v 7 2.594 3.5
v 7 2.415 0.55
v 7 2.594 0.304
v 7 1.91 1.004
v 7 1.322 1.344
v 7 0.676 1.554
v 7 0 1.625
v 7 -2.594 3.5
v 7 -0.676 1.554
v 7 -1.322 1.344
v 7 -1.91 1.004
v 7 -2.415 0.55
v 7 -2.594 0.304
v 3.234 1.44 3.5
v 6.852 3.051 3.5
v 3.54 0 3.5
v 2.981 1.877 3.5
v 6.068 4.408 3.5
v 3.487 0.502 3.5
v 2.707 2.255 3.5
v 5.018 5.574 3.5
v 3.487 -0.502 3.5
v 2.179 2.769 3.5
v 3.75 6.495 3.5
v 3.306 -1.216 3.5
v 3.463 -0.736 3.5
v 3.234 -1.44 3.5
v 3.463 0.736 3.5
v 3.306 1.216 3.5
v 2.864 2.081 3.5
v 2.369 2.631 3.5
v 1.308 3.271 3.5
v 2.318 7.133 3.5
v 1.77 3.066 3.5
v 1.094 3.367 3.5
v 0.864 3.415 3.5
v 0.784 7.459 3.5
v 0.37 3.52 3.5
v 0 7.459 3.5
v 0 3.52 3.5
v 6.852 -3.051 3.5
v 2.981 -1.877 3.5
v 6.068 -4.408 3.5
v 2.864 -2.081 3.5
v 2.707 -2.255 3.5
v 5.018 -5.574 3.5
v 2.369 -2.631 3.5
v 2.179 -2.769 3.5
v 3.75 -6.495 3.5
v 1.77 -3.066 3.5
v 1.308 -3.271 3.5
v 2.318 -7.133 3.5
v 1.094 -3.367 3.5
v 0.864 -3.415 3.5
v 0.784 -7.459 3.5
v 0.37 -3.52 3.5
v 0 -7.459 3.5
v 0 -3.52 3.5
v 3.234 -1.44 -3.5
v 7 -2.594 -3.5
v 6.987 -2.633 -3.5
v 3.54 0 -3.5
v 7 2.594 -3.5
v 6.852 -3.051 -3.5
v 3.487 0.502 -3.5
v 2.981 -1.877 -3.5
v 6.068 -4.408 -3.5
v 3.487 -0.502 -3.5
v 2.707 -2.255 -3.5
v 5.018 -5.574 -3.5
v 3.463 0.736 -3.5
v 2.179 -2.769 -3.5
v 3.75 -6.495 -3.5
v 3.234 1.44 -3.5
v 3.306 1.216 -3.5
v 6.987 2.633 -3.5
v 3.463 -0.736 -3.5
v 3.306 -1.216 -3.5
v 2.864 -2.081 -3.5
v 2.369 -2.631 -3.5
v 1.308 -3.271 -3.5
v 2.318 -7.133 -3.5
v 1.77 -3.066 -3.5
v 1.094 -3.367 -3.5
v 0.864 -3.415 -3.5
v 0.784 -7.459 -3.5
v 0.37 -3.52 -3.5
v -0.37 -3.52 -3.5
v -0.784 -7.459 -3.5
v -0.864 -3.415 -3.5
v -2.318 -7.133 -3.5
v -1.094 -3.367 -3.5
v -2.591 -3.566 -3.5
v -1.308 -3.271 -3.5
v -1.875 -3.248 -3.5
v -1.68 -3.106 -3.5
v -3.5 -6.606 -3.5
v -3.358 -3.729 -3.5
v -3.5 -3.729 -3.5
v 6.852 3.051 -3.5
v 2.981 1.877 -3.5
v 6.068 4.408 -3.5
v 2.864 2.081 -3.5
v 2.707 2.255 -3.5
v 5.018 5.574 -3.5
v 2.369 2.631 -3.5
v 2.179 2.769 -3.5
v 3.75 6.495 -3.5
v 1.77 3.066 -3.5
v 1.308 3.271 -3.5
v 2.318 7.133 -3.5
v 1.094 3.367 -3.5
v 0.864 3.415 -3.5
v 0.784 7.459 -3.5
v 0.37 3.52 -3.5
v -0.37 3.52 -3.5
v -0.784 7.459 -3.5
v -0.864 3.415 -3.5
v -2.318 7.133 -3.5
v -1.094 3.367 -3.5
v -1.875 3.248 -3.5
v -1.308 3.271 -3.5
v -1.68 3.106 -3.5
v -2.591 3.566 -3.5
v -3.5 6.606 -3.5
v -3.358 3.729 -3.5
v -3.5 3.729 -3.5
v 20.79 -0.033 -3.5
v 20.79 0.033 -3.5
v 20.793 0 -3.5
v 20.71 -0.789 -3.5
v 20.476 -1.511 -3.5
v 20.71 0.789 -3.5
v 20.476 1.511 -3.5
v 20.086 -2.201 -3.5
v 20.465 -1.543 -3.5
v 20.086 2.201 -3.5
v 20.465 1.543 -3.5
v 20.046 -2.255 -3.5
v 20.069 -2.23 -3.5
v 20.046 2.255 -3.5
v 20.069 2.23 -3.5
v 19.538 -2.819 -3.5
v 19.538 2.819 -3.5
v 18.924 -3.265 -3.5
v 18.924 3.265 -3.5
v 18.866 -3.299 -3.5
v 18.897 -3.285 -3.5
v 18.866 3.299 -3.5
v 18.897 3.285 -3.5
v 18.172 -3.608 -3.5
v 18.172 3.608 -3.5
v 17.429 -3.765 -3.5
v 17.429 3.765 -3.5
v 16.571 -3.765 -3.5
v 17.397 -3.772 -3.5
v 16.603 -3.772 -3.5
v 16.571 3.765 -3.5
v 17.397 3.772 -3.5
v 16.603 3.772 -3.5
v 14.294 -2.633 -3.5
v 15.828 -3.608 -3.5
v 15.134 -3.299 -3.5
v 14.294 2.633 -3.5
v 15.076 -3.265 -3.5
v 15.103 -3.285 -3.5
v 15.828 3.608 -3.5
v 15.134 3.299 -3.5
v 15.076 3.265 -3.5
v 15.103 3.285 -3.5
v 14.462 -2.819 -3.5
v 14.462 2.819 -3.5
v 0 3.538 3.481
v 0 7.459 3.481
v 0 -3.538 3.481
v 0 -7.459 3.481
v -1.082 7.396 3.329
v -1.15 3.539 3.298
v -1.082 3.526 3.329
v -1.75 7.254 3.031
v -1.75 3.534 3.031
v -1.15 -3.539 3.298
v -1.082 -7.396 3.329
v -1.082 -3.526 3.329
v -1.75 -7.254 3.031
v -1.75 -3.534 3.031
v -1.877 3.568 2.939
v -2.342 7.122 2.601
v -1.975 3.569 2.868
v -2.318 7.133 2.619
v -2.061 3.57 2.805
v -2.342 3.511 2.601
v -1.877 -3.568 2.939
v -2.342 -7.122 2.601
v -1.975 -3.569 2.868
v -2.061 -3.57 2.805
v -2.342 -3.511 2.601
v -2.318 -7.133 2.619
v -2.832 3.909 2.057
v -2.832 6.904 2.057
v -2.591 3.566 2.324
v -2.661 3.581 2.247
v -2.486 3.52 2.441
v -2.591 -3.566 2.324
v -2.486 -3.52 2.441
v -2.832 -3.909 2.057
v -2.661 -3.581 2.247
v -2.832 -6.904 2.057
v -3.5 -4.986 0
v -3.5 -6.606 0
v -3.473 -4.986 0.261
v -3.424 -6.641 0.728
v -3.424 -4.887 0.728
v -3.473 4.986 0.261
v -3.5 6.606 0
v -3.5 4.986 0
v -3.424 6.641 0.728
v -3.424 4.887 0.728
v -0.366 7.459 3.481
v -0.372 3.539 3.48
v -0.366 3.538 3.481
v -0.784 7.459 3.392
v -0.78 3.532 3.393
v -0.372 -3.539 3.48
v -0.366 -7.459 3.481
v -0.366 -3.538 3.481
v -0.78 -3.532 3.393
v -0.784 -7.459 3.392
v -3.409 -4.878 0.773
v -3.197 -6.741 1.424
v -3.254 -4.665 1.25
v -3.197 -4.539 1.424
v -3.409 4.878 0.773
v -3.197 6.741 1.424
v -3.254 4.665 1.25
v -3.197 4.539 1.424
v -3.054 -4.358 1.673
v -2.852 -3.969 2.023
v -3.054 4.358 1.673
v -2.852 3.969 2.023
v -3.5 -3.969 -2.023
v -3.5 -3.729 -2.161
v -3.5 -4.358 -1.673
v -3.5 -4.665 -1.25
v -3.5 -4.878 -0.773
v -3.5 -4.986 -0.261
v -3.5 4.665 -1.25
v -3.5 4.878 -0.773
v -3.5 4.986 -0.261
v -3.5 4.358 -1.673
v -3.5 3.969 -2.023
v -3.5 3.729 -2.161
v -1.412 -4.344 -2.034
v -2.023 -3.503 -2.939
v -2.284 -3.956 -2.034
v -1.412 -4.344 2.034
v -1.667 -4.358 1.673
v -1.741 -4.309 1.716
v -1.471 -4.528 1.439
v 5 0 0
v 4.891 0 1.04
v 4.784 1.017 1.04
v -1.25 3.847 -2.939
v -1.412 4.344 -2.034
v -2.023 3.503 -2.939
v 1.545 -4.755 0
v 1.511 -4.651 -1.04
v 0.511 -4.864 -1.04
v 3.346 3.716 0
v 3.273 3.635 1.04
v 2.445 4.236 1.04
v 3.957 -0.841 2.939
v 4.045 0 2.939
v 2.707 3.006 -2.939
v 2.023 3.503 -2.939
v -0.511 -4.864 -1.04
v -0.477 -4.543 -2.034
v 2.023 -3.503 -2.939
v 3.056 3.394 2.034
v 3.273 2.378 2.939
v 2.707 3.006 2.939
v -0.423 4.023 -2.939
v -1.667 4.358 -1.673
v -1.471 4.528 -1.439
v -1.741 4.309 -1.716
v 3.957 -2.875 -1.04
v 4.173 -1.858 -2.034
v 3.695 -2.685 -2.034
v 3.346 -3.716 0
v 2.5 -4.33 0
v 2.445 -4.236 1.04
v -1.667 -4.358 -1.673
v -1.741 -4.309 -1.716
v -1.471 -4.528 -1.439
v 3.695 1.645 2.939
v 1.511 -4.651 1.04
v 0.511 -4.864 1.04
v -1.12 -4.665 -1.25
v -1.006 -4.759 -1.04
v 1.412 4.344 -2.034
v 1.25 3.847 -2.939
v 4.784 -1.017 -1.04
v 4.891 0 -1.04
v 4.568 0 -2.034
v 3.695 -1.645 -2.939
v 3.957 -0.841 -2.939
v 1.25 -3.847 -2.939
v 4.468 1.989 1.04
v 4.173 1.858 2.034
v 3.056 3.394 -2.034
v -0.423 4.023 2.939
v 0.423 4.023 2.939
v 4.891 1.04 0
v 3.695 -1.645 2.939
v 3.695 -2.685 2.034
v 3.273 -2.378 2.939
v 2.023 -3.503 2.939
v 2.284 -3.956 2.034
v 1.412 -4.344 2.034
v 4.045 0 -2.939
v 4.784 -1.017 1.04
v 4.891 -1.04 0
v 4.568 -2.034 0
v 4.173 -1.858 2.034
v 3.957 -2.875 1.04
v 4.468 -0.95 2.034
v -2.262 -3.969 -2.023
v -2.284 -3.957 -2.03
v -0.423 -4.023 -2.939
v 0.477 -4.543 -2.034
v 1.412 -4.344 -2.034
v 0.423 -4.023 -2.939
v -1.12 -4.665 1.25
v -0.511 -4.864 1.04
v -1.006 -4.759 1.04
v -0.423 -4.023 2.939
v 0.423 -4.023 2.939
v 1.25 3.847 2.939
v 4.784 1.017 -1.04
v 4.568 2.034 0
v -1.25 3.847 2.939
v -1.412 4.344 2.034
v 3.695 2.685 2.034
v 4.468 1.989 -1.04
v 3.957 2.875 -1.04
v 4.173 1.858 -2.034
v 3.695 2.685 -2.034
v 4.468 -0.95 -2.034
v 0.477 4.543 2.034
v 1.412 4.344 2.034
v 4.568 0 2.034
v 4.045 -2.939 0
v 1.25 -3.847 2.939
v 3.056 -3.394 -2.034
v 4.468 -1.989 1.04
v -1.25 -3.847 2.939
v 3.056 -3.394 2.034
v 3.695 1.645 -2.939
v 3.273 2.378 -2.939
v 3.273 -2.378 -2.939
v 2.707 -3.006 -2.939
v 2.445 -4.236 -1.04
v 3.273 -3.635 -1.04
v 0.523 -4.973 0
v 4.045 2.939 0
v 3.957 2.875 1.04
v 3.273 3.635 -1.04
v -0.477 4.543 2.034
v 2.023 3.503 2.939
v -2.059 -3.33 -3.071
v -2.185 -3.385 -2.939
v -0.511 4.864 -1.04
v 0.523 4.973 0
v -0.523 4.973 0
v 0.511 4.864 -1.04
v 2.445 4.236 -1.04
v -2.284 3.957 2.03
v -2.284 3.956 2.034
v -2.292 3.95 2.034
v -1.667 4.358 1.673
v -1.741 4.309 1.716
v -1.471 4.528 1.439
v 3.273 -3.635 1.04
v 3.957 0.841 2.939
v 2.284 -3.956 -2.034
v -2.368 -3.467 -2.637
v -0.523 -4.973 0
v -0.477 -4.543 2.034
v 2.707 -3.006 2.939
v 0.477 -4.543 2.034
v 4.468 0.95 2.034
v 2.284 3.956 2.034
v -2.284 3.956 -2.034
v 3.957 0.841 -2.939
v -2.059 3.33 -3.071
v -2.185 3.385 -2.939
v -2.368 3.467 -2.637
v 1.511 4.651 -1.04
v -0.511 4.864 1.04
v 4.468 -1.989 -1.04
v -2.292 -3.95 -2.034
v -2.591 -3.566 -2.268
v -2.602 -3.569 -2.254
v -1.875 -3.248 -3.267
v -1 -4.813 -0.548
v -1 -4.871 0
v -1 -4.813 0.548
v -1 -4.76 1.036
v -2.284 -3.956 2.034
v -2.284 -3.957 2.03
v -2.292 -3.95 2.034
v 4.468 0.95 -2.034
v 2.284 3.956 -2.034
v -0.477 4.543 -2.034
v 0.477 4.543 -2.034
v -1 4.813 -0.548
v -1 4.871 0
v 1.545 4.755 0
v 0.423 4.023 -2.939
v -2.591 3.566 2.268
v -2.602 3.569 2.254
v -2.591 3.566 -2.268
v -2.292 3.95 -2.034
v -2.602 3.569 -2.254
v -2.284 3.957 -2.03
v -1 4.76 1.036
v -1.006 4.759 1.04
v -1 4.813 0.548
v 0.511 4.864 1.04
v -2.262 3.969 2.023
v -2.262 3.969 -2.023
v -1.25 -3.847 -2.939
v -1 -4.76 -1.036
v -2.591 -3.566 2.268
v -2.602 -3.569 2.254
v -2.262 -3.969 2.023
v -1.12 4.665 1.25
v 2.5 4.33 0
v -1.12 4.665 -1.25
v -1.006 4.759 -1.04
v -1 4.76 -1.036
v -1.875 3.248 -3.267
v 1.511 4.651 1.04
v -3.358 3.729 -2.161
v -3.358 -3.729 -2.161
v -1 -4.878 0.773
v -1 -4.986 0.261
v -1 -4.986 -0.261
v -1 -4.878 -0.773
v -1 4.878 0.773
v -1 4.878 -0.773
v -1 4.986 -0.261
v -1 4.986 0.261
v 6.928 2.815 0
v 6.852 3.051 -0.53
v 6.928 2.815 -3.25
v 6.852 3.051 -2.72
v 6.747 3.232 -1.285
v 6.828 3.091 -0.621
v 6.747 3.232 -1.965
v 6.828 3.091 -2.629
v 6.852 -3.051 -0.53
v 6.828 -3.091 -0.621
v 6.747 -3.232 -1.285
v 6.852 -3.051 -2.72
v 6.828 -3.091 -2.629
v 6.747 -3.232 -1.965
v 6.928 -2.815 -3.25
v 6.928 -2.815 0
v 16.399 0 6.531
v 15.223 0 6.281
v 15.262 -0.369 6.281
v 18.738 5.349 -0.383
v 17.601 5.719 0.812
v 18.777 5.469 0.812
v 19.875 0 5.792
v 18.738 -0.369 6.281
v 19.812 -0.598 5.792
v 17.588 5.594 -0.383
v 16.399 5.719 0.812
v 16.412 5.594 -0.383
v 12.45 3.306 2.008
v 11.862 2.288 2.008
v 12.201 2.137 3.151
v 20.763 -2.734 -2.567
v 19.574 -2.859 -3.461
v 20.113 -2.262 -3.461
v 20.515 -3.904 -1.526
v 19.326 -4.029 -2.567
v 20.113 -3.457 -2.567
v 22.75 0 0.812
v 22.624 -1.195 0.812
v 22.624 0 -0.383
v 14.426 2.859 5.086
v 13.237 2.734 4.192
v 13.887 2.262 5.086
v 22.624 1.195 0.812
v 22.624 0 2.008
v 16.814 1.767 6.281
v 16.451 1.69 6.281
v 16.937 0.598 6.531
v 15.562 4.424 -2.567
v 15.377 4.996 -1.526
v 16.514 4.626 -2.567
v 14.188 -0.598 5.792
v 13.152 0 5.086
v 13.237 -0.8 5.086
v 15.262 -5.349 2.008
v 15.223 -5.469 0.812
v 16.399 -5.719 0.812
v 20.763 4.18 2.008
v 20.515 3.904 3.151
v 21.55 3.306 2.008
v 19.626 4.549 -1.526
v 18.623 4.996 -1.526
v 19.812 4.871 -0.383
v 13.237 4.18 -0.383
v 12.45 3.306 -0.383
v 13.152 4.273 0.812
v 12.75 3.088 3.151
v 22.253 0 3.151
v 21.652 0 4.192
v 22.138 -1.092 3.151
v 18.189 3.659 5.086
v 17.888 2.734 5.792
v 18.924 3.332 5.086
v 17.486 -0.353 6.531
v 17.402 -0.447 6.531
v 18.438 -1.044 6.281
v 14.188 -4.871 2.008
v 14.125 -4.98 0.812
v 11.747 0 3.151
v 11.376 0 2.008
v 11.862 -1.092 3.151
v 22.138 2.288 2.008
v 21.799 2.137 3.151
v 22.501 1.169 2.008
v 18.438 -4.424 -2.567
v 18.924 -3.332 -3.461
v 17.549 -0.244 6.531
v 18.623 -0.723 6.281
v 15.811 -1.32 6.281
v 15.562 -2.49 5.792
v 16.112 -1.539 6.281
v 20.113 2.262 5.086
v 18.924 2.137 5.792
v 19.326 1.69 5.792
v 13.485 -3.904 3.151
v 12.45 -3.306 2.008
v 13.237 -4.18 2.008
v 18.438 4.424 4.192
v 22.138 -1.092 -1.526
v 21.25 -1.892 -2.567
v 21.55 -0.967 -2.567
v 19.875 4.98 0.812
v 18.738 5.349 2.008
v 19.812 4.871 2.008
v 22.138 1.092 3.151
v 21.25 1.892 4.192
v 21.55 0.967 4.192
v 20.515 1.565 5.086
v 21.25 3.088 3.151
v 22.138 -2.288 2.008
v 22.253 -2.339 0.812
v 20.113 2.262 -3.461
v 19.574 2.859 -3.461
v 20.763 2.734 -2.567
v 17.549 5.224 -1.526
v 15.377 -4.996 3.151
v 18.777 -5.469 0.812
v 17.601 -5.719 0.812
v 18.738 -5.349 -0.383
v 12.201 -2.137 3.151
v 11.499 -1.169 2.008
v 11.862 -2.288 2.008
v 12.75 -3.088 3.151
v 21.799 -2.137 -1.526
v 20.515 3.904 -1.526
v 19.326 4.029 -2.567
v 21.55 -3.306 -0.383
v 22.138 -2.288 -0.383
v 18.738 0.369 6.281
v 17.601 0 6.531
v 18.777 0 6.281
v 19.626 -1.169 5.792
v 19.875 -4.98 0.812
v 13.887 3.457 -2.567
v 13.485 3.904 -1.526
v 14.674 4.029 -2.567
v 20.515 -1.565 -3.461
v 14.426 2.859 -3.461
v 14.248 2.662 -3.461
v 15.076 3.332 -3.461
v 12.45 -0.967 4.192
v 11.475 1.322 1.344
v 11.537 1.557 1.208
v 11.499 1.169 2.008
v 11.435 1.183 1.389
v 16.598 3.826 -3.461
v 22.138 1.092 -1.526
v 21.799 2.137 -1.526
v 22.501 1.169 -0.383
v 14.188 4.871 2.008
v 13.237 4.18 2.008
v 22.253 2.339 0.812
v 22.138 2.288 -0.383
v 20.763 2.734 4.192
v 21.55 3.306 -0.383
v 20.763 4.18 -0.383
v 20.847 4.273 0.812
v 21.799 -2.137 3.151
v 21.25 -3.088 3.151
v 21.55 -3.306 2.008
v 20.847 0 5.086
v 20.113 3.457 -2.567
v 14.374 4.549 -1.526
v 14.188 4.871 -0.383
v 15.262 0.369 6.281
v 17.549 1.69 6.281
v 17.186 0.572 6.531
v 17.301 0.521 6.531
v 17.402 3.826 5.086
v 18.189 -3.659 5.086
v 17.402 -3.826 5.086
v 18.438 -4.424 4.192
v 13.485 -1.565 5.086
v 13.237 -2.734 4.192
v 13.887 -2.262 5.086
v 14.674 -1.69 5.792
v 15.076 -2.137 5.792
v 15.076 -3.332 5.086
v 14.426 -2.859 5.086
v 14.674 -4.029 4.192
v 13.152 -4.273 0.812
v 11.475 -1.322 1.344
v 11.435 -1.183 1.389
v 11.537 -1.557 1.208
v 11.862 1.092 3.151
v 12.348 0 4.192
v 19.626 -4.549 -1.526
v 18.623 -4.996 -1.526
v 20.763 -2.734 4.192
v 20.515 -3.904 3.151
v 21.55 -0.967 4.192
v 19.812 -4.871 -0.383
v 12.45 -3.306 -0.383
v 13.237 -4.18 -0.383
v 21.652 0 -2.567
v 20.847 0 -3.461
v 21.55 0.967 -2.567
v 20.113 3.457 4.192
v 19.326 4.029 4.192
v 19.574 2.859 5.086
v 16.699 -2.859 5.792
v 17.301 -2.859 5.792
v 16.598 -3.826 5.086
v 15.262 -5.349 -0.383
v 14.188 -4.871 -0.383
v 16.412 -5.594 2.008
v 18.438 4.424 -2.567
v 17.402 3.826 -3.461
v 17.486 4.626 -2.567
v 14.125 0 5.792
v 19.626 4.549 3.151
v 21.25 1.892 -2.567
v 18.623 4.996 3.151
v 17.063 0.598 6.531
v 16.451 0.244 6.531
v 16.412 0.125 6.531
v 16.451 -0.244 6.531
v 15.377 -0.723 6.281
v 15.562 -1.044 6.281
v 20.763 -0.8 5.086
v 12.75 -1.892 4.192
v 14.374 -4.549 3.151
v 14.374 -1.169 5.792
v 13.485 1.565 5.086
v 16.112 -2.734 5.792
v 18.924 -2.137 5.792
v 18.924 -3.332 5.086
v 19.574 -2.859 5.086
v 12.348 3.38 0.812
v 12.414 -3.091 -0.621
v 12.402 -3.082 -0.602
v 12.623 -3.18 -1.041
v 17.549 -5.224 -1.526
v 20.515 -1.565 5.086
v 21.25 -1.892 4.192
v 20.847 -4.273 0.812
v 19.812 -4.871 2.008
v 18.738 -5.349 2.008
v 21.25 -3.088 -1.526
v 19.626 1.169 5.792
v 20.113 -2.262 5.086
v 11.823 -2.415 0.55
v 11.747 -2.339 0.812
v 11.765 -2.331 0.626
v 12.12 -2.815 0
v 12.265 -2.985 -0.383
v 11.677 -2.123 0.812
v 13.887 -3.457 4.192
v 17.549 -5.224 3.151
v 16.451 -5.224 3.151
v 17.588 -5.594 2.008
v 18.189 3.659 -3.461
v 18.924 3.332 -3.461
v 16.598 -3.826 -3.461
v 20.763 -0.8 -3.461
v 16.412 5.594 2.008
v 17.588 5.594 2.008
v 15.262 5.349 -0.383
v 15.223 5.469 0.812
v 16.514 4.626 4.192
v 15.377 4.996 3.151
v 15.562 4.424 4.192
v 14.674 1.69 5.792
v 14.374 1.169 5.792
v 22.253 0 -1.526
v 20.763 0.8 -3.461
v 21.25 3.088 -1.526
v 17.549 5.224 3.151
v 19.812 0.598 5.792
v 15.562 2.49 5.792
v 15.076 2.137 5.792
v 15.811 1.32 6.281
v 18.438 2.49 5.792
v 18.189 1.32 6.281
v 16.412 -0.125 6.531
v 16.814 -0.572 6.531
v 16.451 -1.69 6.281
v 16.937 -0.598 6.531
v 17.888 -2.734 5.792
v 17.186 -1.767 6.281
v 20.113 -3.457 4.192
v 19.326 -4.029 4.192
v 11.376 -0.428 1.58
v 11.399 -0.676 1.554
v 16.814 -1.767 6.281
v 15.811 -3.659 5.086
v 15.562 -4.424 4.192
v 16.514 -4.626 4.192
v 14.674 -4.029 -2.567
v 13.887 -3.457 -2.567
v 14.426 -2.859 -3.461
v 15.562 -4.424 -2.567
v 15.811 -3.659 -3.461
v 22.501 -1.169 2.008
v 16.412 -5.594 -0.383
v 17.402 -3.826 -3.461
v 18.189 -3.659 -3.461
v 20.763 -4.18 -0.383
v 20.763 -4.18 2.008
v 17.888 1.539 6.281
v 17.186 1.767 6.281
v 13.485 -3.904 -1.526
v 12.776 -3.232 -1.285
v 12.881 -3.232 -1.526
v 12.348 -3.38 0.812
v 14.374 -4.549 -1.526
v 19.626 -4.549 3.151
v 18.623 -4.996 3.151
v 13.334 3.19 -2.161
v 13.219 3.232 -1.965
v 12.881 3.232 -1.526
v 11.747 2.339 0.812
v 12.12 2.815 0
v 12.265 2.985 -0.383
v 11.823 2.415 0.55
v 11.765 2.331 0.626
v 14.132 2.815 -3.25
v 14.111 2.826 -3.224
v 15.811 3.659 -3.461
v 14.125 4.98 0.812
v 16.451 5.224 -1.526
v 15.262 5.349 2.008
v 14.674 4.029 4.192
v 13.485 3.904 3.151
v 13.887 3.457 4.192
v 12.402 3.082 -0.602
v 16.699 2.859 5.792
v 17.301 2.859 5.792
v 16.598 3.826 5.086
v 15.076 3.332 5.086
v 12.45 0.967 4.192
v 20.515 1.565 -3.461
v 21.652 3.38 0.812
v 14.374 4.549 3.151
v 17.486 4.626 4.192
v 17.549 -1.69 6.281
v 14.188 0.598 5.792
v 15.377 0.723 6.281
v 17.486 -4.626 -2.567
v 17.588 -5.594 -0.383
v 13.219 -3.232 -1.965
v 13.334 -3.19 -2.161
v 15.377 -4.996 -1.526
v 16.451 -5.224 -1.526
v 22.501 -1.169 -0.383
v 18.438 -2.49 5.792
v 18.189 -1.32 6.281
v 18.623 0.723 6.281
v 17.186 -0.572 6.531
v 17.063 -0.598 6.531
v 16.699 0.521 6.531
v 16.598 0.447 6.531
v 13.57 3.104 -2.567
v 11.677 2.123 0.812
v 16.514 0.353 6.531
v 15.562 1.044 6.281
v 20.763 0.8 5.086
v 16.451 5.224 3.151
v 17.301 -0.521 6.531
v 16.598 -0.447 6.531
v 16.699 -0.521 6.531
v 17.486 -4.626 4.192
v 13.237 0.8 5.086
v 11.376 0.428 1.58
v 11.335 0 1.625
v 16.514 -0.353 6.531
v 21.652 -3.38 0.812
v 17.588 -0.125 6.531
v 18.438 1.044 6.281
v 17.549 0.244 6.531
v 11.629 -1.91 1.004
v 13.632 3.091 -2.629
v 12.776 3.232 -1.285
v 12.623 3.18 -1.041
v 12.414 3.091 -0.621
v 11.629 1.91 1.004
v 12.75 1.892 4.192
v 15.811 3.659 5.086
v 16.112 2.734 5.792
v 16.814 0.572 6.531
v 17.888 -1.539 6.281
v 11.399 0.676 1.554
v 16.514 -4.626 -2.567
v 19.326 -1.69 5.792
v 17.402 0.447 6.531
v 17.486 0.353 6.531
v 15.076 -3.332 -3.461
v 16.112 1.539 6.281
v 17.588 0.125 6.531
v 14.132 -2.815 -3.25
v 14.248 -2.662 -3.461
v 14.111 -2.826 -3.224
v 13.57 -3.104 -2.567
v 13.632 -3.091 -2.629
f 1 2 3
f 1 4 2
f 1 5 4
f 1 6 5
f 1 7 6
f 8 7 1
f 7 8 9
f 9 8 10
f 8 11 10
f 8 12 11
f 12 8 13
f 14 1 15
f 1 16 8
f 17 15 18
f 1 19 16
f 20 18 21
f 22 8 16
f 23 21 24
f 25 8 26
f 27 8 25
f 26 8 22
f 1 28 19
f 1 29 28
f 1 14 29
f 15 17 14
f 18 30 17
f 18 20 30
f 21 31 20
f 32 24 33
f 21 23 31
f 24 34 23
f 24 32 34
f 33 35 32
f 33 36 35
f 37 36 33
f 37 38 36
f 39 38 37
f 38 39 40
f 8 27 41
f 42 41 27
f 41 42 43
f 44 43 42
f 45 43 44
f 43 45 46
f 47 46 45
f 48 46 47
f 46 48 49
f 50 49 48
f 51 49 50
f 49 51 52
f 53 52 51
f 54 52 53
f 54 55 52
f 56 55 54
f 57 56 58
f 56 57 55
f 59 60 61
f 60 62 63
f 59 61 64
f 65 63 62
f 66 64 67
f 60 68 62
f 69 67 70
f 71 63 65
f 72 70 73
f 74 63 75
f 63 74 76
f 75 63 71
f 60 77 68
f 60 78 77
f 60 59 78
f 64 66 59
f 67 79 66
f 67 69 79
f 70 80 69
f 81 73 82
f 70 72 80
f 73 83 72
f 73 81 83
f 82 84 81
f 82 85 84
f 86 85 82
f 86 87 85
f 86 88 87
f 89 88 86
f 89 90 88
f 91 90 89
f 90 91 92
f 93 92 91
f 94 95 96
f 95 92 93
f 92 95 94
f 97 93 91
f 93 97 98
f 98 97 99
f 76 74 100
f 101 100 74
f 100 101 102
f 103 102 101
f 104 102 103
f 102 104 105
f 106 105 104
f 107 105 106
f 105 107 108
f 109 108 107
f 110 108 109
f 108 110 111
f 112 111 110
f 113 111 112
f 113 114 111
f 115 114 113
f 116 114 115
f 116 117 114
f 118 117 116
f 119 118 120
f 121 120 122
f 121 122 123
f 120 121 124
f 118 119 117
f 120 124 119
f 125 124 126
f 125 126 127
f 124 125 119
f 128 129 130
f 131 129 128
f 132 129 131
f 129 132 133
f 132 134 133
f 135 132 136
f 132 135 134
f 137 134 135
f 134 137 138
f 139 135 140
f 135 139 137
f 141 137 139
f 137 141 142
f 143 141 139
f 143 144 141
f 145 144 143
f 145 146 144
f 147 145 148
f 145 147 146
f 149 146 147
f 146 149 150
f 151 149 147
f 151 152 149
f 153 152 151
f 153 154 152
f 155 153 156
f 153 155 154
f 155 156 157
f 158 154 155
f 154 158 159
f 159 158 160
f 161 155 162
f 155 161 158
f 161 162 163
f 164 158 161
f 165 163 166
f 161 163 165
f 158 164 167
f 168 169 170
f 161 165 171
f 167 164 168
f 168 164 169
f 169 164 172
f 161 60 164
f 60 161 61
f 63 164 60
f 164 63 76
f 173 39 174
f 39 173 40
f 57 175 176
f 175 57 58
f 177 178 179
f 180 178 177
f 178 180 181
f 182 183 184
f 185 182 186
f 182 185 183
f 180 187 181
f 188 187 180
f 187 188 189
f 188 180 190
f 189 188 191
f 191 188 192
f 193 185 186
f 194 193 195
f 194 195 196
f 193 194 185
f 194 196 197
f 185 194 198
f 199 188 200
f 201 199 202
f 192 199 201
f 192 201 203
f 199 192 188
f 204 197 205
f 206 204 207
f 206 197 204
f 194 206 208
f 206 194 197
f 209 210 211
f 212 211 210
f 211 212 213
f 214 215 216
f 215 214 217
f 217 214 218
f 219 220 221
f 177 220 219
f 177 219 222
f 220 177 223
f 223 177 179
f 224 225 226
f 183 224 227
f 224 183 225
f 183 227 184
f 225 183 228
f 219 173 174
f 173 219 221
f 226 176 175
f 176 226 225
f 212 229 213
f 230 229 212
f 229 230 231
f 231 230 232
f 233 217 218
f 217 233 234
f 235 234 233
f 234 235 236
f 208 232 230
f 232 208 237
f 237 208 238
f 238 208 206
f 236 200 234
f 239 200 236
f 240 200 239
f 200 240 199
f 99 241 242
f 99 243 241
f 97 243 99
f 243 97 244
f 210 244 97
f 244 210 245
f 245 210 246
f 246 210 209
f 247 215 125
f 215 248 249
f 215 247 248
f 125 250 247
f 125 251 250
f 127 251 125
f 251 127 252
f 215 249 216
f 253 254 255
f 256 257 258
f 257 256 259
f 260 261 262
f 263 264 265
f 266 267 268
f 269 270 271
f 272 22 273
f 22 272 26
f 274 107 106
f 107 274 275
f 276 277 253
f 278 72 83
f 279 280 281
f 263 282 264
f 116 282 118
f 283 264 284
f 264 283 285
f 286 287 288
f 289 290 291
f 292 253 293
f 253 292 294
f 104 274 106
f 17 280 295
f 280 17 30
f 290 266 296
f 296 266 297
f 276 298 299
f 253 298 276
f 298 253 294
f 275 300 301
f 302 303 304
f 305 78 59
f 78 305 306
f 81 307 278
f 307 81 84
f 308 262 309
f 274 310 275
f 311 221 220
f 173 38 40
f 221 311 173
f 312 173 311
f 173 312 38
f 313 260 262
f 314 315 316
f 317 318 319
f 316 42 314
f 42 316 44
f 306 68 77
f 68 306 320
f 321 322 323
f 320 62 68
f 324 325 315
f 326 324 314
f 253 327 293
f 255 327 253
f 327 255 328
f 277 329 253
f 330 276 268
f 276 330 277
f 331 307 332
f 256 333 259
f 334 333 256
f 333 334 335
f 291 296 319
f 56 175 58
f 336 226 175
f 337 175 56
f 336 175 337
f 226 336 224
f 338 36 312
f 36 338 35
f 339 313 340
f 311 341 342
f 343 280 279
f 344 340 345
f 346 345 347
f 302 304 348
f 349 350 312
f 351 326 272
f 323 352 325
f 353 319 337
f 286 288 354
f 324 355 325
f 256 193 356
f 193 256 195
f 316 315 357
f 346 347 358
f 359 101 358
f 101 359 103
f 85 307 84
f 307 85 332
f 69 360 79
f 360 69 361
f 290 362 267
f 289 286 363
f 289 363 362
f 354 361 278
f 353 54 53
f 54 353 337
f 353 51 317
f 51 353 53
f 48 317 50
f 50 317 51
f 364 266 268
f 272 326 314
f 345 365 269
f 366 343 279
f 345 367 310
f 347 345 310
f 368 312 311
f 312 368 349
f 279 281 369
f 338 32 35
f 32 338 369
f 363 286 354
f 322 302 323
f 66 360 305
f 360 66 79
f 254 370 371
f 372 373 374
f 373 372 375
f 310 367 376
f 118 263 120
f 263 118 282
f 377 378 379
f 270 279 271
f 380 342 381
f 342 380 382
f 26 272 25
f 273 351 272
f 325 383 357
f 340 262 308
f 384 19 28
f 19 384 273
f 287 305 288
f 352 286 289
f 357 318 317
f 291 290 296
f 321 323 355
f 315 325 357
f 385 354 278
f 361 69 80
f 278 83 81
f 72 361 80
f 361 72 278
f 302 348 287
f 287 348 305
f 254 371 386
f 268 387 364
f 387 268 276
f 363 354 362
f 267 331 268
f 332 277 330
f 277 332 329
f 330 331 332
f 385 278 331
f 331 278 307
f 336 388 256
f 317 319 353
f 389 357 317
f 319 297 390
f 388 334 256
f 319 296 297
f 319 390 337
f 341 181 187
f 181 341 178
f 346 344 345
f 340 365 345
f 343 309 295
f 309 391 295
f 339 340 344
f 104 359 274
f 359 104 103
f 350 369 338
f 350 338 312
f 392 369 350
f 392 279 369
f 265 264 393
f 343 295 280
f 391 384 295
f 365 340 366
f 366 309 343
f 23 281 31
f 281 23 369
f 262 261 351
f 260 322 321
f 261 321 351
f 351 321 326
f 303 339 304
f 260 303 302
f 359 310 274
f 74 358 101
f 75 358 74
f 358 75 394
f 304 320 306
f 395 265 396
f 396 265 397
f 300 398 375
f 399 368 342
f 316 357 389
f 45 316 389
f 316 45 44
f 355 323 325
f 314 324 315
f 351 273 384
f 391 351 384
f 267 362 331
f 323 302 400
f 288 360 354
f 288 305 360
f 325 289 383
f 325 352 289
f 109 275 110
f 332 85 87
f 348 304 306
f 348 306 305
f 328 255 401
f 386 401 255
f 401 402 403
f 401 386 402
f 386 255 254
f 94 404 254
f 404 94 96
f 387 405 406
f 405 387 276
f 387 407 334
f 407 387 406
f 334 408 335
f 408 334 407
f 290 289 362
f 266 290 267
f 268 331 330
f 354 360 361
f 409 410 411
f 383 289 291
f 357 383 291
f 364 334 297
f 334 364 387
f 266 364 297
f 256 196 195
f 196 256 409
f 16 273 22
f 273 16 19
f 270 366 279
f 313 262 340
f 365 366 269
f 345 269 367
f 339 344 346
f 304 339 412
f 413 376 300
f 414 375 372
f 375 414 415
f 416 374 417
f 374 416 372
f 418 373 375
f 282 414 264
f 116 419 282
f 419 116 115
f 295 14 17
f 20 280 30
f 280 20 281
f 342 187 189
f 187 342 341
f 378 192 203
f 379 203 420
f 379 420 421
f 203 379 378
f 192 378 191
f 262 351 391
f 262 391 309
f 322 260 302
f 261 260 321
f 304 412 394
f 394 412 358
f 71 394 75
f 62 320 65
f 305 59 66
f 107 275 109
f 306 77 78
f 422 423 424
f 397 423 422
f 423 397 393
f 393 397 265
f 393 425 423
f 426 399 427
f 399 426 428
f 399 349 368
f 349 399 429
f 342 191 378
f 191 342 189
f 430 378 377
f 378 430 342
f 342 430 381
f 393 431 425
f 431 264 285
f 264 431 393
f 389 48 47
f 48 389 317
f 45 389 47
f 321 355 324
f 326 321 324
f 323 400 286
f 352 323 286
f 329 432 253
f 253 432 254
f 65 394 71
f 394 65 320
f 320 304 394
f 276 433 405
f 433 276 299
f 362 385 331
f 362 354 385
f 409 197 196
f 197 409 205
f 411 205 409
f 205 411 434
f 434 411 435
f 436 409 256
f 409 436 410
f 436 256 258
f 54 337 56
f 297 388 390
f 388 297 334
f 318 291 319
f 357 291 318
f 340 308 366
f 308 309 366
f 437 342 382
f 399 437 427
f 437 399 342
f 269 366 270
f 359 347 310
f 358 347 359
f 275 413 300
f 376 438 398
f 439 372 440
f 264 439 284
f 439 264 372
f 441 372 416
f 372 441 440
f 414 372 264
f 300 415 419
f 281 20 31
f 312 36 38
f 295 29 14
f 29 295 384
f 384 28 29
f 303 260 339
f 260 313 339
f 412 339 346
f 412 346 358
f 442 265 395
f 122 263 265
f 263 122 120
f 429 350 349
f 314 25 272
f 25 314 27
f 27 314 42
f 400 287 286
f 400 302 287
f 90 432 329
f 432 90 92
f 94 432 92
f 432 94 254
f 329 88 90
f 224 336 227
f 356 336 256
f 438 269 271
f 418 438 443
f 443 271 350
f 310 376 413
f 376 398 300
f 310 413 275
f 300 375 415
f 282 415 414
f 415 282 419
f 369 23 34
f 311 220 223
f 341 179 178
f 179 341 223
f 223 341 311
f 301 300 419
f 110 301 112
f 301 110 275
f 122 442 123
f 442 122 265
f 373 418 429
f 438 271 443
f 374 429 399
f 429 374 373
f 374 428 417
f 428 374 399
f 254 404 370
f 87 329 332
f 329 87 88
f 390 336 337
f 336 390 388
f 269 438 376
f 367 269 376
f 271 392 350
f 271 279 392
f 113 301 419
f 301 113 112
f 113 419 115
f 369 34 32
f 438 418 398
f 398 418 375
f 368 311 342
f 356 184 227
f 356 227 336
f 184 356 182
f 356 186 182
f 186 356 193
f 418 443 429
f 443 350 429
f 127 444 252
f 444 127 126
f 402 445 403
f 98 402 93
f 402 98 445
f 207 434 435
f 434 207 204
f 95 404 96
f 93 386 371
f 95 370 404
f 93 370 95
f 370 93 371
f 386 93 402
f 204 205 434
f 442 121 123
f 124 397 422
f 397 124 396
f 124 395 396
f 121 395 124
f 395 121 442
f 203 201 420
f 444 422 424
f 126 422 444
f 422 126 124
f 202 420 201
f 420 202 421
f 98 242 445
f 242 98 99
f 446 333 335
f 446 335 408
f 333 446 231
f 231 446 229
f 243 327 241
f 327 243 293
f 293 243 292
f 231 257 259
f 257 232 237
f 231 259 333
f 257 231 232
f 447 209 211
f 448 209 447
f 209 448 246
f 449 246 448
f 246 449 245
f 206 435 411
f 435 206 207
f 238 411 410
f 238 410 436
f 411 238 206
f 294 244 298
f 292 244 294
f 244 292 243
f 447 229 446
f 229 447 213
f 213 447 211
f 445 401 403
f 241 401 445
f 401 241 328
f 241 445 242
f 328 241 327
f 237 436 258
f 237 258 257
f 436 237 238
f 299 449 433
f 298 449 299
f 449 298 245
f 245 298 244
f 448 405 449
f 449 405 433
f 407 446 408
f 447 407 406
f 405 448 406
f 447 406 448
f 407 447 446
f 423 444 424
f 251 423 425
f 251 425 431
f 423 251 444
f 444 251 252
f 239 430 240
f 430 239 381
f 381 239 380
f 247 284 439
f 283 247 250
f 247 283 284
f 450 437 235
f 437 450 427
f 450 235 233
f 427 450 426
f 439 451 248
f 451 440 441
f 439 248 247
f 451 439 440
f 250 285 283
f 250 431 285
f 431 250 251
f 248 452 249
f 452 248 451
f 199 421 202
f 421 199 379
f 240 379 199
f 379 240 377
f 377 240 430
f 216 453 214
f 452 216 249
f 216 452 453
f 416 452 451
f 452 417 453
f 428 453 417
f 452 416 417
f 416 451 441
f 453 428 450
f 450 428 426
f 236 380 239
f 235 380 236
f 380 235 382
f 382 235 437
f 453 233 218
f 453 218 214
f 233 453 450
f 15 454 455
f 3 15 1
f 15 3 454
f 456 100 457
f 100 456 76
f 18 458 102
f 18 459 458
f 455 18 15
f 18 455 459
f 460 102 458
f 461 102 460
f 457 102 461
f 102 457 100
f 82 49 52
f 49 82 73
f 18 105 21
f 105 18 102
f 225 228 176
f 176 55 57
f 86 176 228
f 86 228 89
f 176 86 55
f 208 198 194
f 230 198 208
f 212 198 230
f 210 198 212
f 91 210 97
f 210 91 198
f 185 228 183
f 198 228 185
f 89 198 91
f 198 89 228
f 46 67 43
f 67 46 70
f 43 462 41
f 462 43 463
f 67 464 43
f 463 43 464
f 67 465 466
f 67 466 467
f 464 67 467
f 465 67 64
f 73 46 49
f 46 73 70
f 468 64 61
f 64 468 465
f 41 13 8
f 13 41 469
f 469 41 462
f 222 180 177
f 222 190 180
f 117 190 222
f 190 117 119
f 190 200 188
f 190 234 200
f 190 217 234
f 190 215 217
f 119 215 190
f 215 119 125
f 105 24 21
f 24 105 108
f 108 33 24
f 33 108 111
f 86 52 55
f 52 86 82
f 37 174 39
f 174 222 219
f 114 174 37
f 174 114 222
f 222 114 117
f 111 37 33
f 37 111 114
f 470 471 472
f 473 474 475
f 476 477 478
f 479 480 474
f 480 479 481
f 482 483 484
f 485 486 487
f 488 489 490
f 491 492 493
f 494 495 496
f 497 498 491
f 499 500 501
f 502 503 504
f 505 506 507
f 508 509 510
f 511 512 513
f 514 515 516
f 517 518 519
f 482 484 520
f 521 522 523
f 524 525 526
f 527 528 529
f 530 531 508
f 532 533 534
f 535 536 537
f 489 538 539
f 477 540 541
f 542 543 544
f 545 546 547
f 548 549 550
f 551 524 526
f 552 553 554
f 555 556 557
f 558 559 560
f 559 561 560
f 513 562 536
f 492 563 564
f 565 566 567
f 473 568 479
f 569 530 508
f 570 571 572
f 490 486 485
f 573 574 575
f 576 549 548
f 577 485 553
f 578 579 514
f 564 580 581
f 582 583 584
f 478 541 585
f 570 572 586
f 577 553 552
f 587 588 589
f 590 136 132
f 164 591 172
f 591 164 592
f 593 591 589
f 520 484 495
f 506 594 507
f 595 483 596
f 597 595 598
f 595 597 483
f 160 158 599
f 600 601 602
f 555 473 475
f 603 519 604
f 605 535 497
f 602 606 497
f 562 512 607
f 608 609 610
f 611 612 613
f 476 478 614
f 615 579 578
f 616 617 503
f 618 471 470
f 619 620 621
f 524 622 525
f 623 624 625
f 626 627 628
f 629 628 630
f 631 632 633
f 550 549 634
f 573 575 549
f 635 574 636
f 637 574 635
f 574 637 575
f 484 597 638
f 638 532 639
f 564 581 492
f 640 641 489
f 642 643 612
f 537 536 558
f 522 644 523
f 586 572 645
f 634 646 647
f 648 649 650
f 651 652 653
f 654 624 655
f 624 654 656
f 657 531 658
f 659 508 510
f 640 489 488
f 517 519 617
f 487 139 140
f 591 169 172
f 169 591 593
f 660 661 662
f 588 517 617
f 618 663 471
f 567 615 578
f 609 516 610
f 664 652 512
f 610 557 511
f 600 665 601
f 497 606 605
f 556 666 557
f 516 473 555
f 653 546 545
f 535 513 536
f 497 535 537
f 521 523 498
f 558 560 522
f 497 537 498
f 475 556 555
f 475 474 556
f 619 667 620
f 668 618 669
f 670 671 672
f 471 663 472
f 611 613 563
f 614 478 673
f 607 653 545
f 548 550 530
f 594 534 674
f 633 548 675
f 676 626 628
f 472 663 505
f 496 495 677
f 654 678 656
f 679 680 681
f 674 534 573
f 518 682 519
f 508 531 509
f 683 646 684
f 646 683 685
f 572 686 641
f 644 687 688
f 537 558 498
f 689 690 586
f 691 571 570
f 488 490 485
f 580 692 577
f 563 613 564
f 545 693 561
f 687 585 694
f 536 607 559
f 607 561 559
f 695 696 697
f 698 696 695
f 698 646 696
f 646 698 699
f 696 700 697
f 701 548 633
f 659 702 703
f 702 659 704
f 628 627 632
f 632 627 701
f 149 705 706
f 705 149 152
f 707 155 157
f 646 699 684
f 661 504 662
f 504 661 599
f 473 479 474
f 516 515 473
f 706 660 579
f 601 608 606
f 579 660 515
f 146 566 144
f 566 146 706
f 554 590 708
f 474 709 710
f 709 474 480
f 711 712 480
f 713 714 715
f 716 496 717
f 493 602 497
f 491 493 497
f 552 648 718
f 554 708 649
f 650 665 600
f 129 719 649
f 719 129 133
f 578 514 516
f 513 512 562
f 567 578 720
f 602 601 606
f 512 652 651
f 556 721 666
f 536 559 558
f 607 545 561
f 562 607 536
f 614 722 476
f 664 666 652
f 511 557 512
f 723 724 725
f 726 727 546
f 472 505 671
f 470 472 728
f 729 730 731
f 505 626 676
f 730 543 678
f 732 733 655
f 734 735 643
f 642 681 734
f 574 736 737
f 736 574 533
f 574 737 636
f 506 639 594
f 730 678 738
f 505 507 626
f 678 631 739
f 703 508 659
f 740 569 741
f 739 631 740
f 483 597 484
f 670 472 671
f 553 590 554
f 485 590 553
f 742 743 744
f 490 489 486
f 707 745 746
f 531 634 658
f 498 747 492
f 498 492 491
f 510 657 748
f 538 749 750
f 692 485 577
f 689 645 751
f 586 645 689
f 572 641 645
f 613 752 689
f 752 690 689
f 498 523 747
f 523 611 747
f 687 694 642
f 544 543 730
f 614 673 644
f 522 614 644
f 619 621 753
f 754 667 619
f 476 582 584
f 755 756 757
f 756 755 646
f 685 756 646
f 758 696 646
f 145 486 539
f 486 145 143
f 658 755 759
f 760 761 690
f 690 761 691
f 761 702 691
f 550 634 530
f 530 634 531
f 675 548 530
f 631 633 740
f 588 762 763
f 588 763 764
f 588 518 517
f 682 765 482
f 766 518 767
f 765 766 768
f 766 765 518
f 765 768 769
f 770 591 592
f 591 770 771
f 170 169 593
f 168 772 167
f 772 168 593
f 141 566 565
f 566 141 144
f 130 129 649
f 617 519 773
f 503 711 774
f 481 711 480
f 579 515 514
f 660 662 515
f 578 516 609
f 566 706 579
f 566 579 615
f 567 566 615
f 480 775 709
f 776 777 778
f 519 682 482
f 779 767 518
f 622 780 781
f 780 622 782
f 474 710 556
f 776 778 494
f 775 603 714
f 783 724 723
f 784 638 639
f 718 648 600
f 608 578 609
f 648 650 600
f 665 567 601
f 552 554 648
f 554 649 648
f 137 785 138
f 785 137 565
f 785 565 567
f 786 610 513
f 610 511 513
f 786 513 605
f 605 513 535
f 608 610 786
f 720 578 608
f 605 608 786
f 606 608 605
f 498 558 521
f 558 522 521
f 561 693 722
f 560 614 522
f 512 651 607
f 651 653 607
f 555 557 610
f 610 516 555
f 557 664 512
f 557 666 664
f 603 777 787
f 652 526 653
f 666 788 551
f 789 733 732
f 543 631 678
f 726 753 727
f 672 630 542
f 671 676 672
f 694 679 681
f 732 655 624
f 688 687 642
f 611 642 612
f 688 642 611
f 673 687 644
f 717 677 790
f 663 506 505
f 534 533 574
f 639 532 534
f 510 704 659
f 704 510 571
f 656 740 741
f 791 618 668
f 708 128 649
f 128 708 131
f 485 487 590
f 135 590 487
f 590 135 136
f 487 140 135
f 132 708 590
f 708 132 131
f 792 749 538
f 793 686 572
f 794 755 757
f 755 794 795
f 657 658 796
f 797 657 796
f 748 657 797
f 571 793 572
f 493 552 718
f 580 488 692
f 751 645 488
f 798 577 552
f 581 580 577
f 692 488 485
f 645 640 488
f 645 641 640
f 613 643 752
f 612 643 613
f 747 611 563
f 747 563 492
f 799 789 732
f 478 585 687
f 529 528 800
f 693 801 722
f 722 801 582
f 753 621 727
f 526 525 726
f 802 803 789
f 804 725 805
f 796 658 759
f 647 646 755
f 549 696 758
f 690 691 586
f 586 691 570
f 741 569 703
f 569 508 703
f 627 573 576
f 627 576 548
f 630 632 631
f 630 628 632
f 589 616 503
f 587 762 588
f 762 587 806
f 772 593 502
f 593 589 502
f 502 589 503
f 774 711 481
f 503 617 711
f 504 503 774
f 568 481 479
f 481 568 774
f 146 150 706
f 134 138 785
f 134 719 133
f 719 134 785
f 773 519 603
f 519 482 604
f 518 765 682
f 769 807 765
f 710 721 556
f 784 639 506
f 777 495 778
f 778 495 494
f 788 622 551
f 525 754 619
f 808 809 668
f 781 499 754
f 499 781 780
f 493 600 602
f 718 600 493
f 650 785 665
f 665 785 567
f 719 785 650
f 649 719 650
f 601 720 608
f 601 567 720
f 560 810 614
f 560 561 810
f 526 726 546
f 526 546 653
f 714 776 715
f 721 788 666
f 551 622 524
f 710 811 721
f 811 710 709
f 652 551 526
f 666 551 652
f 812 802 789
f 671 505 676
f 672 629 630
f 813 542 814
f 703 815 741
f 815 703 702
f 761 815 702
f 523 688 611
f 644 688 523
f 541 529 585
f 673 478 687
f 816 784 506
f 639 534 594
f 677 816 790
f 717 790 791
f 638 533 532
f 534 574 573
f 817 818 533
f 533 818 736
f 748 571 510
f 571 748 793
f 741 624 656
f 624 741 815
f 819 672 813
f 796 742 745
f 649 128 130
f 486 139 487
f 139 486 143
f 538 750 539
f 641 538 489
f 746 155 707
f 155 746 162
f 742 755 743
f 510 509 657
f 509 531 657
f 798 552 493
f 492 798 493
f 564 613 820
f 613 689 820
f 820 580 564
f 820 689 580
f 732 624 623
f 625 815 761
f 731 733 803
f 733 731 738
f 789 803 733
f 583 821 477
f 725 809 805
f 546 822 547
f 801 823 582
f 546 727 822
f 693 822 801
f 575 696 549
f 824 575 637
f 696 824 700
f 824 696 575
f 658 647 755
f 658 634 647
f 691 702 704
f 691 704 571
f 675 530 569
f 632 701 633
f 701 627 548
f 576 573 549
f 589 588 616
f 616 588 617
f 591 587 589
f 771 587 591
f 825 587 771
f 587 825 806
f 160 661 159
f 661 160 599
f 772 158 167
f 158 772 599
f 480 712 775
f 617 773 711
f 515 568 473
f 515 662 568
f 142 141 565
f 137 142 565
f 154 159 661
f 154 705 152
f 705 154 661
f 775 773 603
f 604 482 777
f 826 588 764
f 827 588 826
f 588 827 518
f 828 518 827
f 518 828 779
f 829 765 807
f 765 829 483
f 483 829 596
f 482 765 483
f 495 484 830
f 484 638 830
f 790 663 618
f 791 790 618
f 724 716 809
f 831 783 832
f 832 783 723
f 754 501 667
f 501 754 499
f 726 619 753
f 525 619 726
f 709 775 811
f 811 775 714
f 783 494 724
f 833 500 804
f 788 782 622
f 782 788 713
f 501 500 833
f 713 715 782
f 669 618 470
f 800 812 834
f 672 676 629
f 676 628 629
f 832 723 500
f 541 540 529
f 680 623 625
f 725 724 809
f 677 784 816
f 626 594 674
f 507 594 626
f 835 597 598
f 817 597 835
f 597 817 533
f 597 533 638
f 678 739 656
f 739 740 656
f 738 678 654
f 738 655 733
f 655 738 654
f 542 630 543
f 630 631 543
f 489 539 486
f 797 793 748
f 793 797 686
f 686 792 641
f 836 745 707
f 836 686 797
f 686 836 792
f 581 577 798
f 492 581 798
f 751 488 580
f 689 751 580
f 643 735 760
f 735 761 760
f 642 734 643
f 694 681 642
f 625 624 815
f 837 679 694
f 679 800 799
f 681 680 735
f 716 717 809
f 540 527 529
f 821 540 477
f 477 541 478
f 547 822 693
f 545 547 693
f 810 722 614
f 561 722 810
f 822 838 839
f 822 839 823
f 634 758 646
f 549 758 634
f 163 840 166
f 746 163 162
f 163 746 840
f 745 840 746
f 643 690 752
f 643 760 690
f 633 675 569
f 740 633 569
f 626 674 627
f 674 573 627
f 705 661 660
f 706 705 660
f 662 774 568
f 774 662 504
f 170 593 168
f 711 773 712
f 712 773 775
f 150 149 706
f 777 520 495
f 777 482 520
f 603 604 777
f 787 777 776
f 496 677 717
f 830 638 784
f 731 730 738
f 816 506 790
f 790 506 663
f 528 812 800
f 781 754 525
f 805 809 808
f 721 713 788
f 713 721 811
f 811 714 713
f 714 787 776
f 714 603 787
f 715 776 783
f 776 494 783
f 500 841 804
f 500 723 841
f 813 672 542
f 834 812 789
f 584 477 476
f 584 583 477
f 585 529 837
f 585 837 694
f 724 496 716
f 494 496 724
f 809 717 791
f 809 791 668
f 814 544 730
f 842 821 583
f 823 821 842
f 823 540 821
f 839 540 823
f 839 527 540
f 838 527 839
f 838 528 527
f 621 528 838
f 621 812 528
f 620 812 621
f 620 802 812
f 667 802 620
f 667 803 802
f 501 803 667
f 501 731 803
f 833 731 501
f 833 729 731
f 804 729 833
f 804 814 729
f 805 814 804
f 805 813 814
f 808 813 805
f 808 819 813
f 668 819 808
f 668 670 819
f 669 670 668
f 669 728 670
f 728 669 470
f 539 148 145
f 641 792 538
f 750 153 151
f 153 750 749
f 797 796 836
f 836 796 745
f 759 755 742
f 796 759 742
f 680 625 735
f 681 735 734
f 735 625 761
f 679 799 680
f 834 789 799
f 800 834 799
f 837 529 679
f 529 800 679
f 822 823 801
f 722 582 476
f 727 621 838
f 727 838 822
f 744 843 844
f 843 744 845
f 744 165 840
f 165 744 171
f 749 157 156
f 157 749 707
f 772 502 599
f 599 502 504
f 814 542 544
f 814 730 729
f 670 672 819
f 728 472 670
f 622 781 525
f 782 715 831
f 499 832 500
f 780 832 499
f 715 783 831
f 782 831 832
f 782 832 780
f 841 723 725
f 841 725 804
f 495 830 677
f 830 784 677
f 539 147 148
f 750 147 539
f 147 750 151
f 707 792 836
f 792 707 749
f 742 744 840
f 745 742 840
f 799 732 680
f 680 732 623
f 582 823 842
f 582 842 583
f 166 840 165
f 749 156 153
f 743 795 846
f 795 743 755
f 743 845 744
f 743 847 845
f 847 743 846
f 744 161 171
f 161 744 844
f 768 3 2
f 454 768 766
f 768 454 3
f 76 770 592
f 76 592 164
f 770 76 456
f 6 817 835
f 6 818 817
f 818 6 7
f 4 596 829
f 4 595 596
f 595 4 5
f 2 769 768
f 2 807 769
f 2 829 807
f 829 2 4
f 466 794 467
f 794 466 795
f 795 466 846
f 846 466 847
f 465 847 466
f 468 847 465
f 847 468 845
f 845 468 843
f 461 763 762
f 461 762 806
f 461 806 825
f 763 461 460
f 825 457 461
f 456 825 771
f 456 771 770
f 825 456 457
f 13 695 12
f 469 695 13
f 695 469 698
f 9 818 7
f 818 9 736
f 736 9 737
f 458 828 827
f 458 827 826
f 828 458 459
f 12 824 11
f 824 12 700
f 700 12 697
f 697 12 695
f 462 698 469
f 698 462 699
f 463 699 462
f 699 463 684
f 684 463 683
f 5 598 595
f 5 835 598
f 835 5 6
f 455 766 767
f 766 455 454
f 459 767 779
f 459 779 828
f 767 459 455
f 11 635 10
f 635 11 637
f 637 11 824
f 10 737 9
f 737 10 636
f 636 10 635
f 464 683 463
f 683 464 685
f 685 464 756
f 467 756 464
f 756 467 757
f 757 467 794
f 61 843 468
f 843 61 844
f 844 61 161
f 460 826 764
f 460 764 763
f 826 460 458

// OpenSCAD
herofactory_test();

$fn=30;
$hero_sphere_r = 5;
$hero_body_w = 15;
$hero_body_h = 3.5;

module herofactory_test(){

	union(){
			clamp_female();
			translate([17,0,0]) clamp_male();

	}

}


module clamp_male(){
	difference() {	
		union(){
			// Main sphere
			translate([0,00,$hero_sphere_r*.65*.5/2]) #sphere($hero_sphere_r+0.75);				
			rotate([0,-90,0]) translate([-$hero_sphere_r*.65*0.5,0,0]) #cylinder(h=11,r=$hero_sphere_r*.65);
		}
		translate([-12,-$hero_body_w/2,-$hero_body_h-2]) #cube([20,$hero_body_w,2]);
	}
}


module clamp_female() {
	intersection(){
		difference(){
			union(){
				// outer body
				translate([0,-$hero_body_w/2,-$hero_body_h])
					cube([$hero_body_h*2,$hero_body_w,$hero_body_h*2]);

				// Y-rounded cylinder at top of clamp
				rotate([90,0,0]) translate([0,0,-$hero_body_w/2]) #cylinder(h=$hero_body_w,r=$hero_body_h);

				// Y-cube at bottom of clamp
				translate([-$hero_body_h,-$hero_body_w/2,-$hero_body_h])
					cube([$hero_body_h,$hero_body_w,$hero_body_h]);

			}
			// sphere for fitting HF male piece
			translate([0,0,0]) #sphere($hero_sphere_r);

			// remove some material at the insert
			translate([-$hero_sphere_r*.75,0,-$hero_body_h]) cylinder(h=$hero_body_h*2,r=$hero_sphere_r*.75);

			translate([-$hero_sphere_r*1,-$hero_sphere_r*0.5,0]) rotate([0,90,0]) #cylinder(h=4,r=$hero_sphere_r/2);
			translate([-$hero_sphere_r*1,$hero_sphere_r*0.5,0]) rotate([0,90,0]) #cylinder(h=4,r=$hero_sphere_r/2);




	}
	// intersect with a larger cylinder to round off the outer body 
	translate([0,0,-$hero_body_h]) #cylinder(h=$hero_body_h*2,r=$hero_body_w/2);

}
}
